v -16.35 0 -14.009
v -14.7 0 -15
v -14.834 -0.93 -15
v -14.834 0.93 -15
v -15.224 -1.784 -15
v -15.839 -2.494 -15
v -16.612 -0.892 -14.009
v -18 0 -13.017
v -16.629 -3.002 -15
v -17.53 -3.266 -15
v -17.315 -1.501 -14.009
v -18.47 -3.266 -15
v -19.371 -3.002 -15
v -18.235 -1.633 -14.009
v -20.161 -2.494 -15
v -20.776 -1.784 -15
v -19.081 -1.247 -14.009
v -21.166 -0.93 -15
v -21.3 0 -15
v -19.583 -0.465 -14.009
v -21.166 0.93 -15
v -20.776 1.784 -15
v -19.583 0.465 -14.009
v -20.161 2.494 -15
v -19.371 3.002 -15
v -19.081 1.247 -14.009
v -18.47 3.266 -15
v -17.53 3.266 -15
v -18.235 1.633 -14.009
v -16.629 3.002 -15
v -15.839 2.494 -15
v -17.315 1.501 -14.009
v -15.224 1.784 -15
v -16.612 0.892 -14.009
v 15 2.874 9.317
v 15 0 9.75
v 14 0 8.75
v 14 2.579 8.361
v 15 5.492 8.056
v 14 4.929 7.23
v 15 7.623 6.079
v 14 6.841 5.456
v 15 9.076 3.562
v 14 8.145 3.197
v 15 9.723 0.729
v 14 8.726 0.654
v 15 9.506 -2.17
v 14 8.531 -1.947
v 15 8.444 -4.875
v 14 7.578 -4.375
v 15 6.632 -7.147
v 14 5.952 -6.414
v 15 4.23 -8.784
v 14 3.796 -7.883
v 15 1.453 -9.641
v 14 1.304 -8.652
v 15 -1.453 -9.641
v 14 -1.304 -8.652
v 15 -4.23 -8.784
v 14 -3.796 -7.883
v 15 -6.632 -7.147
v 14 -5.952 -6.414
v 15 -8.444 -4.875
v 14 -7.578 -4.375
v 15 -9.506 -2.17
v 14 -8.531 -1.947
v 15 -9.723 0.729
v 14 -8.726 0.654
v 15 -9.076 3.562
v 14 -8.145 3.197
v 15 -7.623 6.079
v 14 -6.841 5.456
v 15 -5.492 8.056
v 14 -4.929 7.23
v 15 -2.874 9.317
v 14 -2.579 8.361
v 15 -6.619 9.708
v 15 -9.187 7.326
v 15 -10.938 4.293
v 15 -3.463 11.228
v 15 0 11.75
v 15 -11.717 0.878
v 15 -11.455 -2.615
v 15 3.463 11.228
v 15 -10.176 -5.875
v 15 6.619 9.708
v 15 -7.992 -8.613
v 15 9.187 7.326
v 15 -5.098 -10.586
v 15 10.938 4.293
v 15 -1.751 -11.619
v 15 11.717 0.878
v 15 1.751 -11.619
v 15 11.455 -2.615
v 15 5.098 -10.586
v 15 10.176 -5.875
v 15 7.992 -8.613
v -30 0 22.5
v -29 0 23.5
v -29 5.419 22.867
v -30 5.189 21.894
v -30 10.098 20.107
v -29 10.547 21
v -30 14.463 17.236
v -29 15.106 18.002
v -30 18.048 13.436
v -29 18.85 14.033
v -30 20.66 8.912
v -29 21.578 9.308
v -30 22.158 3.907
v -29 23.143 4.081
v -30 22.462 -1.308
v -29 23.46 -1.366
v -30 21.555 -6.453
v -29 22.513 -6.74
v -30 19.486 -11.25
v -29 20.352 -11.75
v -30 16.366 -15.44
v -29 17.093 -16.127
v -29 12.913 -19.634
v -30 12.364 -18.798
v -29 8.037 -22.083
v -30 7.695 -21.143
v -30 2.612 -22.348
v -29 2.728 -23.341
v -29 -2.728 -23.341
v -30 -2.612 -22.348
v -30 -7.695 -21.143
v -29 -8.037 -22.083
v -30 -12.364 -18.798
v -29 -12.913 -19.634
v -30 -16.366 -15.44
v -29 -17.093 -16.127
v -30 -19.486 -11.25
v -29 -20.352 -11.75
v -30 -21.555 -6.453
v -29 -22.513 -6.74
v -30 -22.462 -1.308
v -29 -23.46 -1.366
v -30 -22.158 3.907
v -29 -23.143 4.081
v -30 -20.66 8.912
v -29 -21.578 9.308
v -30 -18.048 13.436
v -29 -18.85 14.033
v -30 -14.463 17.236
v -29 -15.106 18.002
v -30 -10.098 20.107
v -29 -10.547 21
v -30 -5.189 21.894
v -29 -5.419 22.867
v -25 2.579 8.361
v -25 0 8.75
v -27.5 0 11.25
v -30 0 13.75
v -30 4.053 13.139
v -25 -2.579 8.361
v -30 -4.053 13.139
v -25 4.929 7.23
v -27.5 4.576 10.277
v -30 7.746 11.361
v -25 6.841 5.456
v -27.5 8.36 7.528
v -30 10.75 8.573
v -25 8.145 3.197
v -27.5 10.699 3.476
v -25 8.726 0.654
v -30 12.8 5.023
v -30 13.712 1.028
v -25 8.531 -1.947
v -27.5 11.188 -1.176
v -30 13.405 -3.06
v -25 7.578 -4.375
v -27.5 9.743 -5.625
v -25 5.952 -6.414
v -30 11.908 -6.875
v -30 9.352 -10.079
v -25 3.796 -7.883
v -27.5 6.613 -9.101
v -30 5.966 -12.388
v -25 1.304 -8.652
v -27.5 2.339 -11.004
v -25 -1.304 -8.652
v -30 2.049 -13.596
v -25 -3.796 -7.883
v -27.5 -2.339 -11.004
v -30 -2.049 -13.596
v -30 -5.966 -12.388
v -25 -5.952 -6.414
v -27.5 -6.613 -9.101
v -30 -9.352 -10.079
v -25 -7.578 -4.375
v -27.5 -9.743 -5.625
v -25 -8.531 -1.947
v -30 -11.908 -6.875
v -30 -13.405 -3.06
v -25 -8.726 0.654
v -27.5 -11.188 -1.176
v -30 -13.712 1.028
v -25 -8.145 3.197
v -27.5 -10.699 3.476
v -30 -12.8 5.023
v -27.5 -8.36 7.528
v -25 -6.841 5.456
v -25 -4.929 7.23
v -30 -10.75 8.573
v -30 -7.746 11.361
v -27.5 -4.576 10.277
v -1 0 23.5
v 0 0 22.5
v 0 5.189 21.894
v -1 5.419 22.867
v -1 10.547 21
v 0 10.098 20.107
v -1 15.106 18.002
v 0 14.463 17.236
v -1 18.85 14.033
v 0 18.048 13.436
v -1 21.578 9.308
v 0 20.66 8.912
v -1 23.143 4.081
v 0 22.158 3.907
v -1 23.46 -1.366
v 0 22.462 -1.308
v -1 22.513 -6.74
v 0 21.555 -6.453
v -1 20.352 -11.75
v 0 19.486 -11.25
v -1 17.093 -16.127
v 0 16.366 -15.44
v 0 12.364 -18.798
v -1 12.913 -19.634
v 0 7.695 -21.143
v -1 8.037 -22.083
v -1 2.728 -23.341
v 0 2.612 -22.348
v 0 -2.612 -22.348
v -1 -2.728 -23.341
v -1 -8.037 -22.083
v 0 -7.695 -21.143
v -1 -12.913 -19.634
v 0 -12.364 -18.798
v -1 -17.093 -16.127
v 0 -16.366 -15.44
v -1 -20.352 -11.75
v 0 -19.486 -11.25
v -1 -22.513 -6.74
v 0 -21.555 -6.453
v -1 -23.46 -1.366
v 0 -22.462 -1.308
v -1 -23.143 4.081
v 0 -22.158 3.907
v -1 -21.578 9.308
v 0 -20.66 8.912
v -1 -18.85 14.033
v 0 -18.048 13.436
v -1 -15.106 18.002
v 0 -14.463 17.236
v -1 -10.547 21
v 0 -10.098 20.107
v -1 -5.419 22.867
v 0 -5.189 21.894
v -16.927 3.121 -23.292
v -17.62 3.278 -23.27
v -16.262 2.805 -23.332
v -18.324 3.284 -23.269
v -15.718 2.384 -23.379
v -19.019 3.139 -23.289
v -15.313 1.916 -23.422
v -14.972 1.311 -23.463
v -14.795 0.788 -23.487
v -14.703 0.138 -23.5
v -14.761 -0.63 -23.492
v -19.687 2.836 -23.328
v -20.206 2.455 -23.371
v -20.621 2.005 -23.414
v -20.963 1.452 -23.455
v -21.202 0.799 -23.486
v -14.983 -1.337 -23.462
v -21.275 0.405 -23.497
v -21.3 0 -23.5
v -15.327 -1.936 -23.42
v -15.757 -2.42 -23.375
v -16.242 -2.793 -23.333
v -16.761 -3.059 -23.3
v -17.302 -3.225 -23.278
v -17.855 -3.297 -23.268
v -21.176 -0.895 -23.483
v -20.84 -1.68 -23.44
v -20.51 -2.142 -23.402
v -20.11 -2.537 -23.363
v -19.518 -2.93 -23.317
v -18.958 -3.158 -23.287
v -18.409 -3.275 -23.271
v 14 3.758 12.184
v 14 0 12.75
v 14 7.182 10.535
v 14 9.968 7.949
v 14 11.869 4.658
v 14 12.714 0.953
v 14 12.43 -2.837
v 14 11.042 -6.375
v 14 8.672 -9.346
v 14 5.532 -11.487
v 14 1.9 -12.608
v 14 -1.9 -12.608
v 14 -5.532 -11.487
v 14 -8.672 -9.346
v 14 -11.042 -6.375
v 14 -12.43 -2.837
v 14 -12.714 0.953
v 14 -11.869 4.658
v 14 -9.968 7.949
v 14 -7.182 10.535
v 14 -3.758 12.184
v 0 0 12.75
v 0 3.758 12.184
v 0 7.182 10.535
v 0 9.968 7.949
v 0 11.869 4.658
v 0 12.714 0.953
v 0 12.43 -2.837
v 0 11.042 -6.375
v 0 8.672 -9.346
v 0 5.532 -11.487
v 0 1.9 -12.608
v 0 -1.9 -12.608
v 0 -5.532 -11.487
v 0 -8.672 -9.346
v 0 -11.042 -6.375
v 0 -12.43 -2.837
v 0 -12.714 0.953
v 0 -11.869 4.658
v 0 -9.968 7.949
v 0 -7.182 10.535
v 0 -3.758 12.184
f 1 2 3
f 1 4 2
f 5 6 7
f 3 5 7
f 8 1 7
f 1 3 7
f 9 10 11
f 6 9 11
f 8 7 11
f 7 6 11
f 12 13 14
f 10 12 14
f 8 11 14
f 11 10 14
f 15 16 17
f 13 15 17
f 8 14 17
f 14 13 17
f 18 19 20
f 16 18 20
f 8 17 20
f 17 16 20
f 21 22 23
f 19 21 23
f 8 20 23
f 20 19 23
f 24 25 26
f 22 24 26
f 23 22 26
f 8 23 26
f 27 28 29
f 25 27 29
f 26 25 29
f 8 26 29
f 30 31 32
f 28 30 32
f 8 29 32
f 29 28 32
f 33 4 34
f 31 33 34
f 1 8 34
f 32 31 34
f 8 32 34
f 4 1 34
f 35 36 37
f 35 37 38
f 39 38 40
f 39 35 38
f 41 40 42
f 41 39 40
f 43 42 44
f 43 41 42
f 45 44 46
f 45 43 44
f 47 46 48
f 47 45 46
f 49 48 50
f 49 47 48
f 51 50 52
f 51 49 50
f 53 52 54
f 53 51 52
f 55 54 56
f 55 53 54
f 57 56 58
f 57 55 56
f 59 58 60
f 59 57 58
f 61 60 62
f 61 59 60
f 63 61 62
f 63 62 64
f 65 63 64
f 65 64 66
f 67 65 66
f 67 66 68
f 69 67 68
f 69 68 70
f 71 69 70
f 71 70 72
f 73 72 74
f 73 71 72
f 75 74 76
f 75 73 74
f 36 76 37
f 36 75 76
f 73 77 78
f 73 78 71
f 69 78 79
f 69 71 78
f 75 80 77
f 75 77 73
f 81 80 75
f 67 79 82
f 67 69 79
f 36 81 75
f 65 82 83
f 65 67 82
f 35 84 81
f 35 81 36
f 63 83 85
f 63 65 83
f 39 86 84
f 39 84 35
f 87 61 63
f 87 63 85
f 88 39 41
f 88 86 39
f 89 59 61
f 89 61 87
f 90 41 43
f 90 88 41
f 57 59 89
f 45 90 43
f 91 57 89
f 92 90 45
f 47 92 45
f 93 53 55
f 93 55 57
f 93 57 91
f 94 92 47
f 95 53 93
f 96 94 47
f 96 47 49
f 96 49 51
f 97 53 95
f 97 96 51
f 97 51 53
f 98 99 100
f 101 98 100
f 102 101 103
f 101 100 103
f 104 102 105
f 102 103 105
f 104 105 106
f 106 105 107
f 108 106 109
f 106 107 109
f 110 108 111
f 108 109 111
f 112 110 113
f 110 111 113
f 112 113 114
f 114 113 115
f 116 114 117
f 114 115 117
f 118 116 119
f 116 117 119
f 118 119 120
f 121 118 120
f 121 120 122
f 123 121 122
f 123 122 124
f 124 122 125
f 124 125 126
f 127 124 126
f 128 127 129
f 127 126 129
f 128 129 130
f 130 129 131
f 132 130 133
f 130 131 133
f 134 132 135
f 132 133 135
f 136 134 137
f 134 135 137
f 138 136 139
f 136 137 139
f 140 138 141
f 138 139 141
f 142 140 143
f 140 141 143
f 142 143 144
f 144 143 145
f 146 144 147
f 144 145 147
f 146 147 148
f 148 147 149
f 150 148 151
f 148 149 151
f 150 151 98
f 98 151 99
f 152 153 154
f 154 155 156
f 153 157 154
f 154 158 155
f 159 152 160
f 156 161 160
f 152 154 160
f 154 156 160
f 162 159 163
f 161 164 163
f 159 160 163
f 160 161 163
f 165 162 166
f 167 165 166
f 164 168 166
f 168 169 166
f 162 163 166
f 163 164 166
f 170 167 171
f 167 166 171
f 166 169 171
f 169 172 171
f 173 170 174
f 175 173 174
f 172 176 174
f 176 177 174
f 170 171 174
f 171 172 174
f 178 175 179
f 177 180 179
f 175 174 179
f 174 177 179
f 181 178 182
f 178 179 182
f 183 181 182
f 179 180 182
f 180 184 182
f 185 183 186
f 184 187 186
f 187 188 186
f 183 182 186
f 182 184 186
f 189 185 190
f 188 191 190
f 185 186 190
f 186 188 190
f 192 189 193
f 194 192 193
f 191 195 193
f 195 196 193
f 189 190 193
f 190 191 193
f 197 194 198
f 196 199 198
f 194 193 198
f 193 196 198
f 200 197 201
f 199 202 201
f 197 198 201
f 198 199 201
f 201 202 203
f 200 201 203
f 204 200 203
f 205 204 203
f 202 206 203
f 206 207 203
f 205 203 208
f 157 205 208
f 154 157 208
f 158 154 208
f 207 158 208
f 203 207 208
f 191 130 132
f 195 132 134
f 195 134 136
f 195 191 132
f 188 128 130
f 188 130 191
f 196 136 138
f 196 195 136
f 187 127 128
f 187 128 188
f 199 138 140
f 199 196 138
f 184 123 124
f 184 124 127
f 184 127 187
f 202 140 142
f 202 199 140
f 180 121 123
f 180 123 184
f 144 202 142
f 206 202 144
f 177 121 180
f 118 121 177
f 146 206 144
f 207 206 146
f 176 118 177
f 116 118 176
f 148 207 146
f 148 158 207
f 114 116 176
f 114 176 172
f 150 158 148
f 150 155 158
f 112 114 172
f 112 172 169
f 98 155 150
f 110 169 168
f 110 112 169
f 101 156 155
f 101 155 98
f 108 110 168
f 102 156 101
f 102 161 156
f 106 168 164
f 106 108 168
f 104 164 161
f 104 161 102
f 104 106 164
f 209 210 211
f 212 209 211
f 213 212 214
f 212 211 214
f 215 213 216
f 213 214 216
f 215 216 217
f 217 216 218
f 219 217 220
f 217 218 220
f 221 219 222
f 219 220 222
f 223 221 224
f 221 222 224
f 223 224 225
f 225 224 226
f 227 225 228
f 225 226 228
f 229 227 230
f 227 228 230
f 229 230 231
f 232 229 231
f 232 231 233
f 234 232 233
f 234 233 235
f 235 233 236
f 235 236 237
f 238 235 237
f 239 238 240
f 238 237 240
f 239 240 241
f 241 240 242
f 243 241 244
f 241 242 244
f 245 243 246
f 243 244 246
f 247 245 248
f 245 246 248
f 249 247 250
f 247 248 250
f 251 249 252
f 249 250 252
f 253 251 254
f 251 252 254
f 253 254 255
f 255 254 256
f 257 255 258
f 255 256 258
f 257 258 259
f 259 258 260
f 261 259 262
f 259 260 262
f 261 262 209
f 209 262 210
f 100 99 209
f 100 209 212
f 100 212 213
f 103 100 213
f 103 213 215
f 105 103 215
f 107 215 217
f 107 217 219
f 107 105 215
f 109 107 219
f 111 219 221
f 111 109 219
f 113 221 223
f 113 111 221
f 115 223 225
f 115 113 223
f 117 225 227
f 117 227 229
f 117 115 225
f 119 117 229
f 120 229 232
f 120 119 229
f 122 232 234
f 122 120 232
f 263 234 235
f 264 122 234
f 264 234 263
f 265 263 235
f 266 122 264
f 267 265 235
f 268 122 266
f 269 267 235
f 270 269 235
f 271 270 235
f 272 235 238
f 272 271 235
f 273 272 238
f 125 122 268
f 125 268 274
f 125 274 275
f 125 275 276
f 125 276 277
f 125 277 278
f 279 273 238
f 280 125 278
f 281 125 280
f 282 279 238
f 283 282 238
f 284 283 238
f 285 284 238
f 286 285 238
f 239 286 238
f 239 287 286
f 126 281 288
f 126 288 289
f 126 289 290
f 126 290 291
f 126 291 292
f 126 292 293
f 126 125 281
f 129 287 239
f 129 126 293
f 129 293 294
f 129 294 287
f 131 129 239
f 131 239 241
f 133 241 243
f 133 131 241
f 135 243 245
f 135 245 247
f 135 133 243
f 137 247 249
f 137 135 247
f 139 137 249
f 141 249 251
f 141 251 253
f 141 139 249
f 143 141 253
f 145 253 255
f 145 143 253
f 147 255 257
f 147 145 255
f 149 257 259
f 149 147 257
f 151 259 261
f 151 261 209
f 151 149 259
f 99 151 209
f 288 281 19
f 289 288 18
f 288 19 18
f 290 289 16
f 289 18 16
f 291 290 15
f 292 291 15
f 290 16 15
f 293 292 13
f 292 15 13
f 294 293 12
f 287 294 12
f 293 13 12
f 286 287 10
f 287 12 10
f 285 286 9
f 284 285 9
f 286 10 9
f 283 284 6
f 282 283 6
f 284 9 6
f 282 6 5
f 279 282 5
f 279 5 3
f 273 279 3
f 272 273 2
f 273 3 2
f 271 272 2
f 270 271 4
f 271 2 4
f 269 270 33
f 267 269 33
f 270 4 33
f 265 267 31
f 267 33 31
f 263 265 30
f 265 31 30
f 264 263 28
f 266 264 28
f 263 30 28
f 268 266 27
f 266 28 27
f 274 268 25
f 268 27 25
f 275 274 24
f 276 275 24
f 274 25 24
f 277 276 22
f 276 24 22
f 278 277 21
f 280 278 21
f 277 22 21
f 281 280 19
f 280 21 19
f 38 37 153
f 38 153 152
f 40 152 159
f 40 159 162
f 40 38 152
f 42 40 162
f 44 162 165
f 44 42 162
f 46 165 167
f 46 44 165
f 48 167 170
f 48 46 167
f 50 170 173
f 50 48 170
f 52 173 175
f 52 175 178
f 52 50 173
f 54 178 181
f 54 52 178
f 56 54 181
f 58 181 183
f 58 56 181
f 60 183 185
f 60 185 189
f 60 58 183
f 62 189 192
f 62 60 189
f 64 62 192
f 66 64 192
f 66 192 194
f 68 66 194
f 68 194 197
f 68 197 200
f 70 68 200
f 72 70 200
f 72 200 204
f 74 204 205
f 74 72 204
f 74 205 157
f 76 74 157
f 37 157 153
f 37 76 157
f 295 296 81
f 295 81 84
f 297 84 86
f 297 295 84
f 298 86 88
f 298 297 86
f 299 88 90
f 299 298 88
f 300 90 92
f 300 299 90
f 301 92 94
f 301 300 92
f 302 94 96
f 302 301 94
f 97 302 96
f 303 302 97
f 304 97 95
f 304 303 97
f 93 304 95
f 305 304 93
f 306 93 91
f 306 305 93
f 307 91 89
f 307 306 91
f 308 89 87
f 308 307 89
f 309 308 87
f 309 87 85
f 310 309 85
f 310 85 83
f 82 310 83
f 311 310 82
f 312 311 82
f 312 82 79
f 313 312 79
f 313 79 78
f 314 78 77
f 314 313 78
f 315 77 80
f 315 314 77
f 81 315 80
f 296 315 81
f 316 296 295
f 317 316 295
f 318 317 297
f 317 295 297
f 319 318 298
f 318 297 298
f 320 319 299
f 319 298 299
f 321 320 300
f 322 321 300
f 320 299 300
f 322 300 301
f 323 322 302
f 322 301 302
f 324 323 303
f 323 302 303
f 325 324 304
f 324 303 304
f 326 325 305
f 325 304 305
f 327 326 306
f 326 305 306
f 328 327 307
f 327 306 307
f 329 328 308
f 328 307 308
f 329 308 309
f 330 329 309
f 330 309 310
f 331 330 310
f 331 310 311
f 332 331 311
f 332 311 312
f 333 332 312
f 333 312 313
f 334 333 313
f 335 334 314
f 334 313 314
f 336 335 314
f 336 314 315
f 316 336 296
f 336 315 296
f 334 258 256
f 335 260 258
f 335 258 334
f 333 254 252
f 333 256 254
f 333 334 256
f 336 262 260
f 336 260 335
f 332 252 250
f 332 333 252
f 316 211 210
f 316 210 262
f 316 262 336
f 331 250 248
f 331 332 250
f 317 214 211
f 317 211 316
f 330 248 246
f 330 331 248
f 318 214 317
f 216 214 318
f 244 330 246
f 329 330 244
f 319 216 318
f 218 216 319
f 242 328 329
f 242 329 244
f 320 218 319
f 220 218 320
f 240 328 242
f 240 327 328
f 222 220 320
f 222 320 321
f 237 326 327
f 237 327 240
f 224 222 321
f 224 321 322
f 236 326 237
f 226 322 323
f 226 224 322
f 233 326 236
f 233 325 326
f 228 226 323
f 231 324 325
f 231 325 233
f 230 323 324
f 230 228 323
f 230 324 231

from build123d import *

# Parameters (mm, degrees)
F0_W     = 15
F0_H     = 4
F3_SIZE  = 5
F6_D     = 6.6
F6_DEPTH = 10
F6_TIP   = 1.9828400428
F7_SIZE  = 1


with BuildPart() as f1:
    # F0 (on Front) → F1 (revolve)
    with BuildSketch(Plane.XZ):
        Polygon((-30, 8.75), (0, 8.75), (0, 12.75), (0, 23.5), (-30, 23.5), align=None)
        with Locations((7.5, 10.75)):
            Rectangle(F0_W, F0_H)
    revolve(axis=Axis((-19.2540567368, 0, 0), (-1, 0, 0)))

    # F3
    f3_edges = [f1.edges().sort_by_distance(p)[0] for p in [
        (-30, 0, -8.75),
    ]]
    chamfer(f3_edges, length=F3_SIZE)

    # F6
    with Locations(Plane(origin=(0, 0, -25), x_dir=(1, 0, 0), z_dir=(0, 0, -1))):
        with Locations((-18, 0)):
            Hole(F6_D / 2, depth=F6_DEPTH)
            with Locations((0, 0, -(F6_DEPTH + F6_TIP / 2))):  # 118° drill point
                Cone(0, F6_D / 2, F6_TIP, mode=Mode.SUBTRACT)

    # F7
    f7_edges = [f1.edges().sort_by_distance(p)[0] for p in [
        (-30, 0, -23.5),
        (0, 0, -23.5),
        (15, 0, -12.75),
        (15, 0, -8.75),
    ]]
    chamfer(f7_edges, length=F7_SIZE)


solid = f1.part
